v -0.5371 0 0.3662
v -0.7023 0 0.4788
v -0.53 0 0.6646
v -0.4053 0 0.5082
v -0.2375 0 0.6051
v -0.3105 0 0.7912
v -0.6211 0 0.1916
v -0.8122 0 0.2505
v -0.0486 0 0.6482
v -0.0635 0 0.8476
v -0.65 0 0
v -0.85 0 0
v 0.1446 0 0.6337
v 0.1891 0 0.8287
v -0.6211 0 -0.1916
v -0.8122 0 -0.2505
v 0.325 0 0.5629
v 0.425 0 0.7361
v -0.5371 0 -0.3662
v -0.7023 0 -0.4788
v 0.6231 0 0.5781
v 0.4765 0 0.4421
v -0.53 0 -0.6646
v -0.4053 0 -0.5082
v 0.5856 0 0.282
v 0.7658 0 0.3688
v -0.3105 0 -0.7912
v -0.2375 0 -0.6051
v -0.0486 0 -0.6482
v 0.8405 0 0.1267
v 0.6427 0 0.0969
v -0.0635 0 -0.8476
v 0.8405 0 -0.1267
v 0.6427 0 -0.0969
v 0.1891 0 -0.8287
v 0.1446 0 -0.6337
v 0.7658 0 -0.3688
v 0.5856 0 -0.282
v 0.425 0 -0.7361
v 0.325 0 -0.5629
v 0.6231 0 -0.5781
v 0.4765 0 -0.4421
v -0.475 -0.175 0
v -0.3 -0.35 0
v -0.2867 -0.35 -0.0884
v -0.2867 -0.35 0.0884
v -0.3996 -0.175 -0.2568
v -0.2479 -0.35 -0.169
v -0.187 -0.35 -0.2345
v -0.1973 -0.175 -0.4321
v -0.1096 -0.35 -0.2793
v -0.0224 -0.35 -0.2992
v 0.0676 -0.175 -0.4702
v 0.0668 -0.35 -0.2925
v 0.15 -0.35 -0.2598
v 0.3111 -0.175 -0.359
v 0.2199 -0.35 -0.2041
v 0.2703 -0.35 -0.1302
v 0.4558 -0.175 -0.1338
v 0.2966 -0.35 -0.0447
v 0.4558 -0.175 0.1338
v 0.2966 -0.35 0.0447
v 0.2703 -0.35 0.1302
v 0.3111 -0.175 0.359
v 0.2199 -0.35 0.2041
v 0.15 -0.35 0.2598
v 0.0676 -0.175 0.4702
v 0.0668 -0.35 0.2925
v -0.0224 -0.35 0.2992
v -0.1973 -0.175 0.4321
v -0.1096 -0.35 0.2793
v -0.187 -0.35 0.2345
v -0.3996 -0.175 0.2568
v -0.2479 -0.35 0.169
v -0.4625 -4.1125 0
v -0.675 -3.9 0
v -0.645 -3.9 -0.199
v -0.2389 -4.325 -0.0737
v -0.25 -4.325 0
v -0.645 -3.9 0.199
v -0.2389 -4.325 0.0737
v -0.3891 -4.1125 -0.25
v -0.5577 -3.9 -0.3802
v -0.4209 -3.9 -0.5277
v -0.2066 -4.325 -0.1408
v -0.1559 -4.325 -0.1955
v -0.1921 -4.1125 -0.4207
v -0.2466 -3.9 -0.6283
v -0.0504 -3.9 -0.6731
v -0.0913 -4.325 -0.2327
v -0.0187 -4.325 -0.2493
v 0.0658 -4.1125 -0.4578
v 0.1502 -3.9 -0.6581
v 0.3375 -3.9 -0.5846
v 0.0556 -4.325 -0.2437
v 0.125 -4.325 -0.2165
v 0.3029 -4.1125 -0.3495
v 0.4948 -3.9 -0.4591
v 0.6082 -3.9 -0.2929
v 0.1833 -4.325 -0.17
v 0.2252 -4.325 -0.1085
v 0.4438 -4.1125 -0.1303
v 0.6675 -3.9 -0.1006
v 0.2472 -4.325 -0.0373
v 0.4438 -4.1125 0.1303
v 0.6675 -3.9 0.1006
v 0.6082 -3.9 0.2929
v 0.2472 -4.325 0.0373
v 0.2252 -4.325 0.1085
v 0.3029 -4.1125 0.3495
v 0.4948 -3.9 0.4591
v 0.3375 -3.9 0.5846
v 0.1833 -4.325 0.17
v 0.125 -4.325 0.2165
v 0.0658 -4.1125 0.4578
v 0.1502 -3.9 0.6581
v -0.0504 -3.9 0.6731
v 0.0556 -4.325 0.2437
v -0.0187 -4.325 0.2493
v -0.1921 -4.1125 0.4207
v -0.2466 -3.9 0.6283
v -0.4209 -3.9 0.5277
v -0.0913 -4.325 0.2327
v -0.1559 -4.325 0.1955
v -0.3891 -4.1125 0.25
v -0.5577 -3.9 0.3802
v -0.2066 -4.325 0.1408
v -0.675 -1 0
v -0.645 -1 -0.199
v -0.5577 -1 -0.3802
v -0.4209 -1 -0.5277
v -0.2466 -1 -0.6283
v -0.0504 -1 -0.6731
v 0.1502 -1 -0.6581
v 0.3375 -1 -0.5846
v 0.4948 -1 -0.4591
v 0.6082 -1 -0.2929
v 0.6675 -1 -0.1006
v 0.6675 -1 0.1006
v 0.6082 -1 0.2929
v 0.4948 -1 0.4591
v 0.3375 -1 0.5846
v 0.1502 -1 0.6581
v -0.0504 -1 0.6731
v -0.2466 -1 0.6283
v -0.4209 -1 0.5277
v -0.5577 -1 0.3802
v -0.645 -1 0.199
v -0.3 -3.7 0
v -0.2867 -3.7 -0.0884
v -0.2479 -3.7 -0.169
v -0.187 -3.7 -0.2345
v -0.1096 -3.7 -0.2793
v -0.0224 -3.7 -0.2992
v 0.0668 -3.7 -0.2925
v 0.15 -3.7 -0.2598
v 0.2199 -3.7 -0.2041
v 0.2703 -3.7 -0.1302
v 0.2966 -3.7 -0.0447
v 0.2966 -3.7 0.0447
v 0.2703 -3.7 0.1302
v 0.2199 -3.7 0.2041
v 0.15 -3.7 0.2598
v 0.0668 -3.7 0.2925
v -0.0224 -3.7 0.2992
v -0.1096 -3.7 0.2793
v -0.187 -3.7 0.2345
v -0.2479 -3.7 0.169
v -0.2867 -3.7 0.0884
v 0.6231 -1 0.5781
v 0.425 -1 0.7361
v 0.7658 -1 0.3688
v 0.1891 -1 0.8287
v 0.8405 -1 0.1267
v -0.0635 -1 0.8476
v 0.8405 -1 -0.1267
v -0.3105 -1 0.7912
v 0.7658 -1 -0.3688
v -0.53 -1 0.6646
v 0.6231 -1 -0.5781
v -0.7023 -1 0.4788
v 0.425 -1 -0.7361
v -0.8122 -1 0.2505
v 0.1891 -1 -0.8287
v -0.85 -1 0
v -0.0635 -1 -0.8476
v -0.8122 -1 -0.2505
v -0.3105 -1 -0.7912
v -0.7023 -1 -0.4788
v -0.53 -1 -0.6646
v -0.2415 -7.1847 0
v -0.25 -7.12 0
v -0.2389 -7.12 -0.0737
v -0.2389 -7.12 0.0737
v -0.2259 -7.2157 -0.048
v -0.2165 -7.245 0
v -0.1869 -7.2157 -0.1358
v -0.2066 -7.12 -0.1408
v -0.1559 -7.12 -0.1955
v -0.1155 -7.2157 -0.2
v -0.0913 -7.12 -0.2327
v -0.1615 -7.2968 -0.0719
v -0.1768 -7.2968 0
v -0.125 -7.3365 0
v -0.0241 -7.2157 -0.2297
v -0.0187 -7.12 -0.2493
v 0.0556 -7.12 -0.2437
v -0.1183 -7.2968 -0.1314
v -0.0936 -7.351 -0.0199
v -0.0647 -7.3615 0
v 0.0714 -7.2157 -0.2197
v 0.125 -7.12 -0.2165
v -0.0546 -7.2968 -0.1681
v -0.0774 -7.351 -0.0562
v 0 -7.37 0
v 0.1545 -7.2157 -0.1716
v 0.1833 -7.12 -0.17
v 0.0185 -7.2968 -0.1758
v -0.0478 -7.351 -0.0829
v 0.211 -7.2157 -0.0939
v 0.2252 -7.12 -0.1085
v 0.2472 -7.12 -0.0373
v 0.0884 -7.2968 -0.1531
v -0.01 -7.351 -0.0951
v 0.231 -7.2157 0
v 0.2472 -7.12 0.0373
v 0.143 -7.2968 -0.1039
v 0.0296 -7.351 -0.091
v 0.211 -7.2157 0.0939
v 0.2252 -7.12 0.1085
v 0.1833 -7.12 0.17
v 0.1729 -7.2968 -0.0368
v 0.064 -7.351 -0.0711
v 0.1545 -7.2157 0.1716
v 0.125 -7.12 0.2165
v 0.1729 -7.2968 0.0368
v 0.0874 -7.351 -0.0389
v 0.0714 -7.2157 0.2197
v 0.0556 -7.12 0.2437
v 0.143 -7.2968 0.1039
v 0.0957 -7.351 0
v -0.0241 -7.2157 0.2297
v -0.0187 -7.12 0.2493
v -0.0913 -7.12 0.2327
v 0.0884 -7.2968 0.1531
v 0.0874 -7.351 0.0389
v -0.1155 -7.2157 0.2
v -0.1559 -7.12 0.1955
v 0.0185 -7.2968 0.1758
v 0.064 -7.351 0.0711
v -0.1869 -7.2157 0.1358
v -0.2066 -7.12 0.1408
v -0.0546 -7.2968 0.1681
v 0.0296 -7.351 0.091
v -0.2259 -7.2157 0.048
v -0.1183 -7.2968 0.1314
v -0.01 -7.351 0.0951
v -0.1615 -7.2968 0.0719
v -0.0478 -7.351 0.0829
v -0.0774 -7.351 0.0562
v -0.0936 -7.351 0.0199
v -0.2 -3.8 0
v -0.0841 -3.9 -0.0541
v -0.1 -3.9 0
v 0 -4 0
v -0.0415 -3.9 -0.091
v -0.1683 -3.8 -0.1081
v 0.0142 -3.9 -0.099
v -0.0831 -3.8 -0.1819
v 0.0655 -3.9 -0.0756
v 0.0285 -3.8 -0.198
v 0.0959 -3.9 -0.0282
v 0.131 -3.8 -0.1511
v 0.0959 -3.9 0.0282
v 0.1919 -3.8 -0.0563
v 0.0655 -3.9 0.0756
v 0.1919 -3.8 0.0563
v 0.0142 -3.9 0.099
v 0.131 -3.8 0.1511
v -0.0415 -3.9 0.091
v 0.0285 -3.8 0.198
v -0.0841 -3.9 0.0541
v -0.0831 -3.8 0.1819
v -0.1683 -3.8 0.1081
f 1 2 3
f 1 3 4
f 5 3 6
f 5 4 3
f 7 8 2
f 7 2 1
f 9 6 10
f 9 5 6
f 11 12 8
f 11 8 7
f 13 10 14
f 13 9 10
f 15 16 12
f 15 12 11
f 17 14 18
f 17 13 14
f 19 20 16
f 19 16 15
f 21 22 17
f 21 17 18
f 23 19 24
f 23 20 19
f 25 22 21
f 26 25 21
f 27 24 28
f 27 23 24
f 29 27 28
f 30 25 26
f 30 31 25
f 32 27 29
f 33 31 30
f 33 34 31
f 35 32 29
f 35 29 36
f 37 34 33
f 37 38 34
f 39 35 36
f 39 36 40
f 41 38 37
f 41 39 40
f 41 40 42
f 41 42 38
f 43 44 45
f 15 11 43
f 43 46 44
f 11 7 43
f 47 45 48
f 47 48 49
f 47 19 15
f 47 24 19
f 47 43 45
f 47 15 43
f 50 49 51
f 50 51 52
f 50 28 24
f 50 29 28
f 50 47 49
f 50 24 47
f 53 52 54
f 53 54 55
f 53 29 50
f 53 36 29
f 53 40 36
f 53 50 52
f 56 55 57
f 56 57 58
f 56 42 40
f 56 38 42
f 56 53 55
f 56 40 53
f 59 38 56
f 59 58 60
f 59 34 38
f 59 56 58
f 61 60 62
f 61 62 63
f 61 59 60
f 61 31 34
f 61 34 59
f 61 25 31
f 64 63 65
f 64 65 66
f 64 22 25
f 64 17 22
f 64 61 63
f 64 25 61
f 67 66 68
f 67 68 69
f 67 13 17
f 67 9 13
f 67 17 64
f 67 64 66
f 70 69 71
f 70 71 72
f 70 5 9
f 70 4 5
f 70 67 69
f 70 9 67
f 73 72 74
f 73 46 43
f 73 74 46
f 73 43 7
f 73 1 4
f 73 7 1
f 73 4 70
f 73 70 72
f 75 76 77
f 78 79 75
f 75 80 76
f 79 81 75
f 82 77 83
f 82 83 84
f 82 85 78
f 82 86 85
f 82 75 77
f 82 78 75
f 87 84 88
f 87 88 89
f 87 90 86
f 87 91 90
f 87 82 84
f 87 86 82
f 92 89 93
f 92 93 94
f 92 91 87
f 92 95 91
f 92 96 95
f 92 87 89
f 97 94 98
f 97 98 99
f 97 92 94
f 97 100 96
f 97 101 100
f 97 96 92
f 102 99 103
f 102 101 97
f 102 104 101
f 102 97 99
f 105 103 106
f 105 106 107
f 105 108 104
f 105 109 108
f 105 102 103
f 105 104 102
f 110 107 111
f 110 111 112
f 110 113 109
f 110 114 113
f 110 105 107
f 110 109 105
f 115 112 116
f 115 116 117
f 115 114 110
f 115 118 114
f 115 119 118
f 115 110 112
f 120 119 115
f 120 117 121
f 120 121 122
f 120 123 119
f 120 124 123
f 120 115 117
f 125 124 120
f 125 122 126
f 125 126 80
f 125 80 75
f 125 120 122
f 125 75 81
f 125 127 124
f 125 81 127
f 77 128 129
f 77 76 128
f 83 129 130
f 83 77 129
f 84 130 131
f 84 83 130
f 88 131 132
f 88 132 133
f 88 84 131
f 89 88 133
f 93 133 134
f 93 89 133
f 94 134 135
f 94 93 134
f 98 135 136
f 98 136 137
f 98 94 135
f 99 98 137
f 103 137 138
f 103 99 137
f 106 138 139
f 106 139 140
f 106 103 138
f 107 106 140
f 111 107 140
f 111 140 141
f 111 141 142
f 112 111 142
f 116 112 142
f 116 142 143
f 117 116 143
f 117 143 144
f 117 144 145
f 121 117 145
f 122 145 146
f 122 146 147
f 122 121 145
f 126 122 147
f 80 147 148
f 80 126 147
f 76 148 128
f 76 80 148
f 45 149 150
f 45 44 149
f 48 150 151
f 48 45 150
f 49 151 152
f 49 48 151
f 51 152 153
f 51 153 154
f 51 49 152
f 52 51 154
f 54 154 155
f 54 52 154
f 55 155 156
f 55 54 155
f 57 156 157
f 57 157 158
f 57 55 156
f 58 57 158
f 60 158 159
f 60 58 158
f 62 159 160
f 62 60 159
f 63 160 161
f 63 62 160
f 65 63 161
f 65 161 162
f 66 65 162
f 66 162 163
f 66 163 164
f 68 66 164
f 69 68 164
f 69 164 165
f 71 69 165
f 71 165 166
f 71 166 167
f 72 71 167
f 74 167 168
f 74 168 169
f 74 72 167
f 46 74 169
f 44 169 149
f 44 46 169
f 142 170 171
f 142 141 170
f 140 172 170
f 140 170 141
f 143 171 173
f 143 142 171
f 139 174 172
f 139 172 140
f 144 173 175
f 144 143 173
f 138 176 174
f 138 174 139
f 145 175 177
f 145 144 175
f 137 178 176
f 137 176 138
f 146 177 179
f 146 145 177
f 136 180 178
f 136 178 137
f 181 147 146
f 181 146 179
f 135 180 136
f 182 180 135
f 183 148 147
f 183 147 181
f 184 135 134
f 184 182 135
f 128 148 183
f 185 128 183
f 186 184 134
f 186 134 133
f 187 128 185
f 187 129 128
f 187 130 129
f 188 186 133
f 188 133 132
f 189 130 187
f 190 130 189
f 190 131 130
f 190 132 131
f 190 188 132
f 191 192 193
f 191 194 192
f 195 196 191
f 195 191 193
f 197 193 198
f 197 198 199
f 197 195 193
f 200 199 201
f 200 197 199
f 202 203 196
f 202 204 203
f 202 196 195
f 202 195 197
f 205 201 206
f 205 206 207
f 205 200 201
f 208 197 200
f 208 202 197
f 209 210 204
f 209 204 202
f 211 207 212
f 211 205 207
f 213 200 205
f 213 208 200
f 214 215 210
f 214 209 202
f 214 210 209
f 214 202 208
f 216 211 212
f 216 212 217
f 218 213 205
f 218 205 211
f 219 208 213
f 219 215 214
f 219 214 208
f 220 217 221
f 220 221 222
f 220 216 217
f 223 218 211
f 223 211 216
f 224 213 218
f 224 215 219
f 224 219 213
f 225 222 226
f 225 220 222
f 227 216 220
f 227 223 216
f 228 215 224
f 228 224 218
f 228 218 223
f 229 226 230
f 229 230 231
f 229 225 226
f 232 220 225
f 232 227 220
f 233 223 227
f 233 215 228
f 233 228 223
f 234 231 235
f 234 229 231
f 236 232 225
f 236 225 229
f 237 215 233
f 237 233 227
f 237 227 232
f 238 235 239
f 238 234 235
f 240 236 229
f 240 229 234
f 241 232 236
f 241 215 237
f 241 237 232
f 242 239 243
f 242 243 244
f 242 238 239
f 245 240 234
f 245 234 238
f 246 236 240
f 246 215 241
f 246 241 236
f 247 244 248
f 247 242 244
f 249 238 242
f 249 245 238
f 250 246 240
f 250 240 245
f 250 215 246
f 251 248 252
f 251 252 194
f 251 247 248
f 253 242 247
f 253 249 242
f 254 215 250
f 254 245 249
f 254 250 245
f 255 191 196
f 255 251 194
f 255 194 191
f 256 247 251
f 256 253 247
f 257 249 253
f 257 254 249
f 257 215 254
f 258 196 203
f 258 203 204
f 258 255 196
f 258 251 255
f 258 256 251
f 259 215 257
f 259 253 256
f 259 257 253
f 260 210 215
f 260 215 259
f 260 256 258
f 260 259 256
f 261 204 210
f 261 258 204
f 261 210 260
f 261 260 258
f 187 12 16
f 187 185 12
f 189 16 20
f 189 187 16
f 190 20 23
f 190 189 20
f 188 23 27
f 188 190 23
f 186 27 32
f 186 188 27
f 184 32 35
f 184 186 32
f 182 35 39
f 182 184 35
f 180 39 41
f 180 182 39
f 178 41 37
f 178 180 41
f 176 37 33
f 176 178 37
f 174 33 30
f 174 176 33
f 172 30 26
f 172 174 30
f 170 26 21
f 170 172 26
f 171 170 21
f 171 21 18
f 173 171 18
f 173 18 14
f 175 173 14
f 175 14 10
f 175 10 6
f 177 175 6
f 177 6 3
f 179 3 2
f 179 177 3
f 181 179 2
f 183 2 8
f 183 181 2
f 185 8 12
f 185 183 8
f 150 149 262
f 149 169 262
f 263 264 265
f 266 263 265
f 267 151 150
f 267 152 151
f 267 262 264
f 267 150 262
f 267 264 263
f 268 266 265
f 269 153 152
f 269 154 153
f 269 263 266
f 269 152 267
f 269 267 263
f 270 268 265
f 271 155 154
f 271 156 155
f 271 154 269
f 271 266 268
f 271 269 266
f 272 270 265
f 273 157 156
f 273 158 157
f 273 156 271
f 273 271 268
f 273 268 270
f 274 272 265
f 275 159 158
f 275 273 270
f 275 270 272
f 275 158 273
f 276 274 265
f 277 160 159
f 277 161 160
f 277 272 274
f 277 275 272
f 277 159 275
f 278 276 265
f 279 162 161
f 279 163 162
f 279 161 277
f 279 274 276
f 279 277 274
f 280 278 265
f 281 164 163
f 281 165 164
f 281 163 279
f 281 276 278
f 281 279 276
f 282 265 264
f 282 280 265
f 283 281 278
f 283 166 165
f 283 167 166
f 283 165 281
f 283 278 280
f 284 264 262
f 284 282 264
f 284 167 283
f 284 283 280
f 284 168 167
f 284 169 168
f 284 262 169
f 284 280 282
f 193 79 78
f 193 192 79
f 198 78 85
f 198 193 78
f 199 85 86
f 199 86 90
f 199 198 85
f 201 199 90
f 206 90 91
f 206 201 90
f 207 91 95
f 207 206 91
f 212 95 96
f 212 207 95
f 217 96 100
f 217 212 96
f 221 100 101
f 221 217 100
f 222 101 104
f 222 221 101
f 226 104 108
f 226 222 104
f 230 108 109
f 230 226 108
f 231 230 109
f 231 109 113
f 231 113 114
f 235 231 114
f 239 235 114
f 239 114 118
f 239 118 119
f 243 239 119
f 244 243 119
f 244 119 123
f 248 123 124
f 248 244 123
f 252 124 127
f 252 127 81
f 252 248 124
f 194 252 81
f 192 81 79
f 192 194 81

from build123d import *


with BuildPart() as part:
    # Sketch1 → Revolve1 (revolve)
    with BuildSketch(Plane.XY):
        with BuildLine():
            Line((-0.85, 0), (-0.85, -1))
            Line((-0.85, -1), (-0.675, -1))
            Line((-0.675, -1), (-0.675, -3.9))
            Line((-0.675, -3.9), (-0.25, -4.325))
            Line((-0.25, -4.325), (-0.25, -7.12))
            ThreePointArc((-0.25, -7.12), (-0.176776695, -7.296776695), (0, -7.37))
            Line((0, -7.37), (0, -4))
            Line((0, -4), (-0.3, -3.7))
            Line((-0.3, -3.7), (-0.3, -0.35))
            Line((-0.3, -0.35), (-0.65, 0))
            Line((-0.65, 0), (-0.85, 0))
        make_face()
    revolve(axis=Axis((0, 28.992562867, 0), (0, -1, 0)))


solid = part.part
